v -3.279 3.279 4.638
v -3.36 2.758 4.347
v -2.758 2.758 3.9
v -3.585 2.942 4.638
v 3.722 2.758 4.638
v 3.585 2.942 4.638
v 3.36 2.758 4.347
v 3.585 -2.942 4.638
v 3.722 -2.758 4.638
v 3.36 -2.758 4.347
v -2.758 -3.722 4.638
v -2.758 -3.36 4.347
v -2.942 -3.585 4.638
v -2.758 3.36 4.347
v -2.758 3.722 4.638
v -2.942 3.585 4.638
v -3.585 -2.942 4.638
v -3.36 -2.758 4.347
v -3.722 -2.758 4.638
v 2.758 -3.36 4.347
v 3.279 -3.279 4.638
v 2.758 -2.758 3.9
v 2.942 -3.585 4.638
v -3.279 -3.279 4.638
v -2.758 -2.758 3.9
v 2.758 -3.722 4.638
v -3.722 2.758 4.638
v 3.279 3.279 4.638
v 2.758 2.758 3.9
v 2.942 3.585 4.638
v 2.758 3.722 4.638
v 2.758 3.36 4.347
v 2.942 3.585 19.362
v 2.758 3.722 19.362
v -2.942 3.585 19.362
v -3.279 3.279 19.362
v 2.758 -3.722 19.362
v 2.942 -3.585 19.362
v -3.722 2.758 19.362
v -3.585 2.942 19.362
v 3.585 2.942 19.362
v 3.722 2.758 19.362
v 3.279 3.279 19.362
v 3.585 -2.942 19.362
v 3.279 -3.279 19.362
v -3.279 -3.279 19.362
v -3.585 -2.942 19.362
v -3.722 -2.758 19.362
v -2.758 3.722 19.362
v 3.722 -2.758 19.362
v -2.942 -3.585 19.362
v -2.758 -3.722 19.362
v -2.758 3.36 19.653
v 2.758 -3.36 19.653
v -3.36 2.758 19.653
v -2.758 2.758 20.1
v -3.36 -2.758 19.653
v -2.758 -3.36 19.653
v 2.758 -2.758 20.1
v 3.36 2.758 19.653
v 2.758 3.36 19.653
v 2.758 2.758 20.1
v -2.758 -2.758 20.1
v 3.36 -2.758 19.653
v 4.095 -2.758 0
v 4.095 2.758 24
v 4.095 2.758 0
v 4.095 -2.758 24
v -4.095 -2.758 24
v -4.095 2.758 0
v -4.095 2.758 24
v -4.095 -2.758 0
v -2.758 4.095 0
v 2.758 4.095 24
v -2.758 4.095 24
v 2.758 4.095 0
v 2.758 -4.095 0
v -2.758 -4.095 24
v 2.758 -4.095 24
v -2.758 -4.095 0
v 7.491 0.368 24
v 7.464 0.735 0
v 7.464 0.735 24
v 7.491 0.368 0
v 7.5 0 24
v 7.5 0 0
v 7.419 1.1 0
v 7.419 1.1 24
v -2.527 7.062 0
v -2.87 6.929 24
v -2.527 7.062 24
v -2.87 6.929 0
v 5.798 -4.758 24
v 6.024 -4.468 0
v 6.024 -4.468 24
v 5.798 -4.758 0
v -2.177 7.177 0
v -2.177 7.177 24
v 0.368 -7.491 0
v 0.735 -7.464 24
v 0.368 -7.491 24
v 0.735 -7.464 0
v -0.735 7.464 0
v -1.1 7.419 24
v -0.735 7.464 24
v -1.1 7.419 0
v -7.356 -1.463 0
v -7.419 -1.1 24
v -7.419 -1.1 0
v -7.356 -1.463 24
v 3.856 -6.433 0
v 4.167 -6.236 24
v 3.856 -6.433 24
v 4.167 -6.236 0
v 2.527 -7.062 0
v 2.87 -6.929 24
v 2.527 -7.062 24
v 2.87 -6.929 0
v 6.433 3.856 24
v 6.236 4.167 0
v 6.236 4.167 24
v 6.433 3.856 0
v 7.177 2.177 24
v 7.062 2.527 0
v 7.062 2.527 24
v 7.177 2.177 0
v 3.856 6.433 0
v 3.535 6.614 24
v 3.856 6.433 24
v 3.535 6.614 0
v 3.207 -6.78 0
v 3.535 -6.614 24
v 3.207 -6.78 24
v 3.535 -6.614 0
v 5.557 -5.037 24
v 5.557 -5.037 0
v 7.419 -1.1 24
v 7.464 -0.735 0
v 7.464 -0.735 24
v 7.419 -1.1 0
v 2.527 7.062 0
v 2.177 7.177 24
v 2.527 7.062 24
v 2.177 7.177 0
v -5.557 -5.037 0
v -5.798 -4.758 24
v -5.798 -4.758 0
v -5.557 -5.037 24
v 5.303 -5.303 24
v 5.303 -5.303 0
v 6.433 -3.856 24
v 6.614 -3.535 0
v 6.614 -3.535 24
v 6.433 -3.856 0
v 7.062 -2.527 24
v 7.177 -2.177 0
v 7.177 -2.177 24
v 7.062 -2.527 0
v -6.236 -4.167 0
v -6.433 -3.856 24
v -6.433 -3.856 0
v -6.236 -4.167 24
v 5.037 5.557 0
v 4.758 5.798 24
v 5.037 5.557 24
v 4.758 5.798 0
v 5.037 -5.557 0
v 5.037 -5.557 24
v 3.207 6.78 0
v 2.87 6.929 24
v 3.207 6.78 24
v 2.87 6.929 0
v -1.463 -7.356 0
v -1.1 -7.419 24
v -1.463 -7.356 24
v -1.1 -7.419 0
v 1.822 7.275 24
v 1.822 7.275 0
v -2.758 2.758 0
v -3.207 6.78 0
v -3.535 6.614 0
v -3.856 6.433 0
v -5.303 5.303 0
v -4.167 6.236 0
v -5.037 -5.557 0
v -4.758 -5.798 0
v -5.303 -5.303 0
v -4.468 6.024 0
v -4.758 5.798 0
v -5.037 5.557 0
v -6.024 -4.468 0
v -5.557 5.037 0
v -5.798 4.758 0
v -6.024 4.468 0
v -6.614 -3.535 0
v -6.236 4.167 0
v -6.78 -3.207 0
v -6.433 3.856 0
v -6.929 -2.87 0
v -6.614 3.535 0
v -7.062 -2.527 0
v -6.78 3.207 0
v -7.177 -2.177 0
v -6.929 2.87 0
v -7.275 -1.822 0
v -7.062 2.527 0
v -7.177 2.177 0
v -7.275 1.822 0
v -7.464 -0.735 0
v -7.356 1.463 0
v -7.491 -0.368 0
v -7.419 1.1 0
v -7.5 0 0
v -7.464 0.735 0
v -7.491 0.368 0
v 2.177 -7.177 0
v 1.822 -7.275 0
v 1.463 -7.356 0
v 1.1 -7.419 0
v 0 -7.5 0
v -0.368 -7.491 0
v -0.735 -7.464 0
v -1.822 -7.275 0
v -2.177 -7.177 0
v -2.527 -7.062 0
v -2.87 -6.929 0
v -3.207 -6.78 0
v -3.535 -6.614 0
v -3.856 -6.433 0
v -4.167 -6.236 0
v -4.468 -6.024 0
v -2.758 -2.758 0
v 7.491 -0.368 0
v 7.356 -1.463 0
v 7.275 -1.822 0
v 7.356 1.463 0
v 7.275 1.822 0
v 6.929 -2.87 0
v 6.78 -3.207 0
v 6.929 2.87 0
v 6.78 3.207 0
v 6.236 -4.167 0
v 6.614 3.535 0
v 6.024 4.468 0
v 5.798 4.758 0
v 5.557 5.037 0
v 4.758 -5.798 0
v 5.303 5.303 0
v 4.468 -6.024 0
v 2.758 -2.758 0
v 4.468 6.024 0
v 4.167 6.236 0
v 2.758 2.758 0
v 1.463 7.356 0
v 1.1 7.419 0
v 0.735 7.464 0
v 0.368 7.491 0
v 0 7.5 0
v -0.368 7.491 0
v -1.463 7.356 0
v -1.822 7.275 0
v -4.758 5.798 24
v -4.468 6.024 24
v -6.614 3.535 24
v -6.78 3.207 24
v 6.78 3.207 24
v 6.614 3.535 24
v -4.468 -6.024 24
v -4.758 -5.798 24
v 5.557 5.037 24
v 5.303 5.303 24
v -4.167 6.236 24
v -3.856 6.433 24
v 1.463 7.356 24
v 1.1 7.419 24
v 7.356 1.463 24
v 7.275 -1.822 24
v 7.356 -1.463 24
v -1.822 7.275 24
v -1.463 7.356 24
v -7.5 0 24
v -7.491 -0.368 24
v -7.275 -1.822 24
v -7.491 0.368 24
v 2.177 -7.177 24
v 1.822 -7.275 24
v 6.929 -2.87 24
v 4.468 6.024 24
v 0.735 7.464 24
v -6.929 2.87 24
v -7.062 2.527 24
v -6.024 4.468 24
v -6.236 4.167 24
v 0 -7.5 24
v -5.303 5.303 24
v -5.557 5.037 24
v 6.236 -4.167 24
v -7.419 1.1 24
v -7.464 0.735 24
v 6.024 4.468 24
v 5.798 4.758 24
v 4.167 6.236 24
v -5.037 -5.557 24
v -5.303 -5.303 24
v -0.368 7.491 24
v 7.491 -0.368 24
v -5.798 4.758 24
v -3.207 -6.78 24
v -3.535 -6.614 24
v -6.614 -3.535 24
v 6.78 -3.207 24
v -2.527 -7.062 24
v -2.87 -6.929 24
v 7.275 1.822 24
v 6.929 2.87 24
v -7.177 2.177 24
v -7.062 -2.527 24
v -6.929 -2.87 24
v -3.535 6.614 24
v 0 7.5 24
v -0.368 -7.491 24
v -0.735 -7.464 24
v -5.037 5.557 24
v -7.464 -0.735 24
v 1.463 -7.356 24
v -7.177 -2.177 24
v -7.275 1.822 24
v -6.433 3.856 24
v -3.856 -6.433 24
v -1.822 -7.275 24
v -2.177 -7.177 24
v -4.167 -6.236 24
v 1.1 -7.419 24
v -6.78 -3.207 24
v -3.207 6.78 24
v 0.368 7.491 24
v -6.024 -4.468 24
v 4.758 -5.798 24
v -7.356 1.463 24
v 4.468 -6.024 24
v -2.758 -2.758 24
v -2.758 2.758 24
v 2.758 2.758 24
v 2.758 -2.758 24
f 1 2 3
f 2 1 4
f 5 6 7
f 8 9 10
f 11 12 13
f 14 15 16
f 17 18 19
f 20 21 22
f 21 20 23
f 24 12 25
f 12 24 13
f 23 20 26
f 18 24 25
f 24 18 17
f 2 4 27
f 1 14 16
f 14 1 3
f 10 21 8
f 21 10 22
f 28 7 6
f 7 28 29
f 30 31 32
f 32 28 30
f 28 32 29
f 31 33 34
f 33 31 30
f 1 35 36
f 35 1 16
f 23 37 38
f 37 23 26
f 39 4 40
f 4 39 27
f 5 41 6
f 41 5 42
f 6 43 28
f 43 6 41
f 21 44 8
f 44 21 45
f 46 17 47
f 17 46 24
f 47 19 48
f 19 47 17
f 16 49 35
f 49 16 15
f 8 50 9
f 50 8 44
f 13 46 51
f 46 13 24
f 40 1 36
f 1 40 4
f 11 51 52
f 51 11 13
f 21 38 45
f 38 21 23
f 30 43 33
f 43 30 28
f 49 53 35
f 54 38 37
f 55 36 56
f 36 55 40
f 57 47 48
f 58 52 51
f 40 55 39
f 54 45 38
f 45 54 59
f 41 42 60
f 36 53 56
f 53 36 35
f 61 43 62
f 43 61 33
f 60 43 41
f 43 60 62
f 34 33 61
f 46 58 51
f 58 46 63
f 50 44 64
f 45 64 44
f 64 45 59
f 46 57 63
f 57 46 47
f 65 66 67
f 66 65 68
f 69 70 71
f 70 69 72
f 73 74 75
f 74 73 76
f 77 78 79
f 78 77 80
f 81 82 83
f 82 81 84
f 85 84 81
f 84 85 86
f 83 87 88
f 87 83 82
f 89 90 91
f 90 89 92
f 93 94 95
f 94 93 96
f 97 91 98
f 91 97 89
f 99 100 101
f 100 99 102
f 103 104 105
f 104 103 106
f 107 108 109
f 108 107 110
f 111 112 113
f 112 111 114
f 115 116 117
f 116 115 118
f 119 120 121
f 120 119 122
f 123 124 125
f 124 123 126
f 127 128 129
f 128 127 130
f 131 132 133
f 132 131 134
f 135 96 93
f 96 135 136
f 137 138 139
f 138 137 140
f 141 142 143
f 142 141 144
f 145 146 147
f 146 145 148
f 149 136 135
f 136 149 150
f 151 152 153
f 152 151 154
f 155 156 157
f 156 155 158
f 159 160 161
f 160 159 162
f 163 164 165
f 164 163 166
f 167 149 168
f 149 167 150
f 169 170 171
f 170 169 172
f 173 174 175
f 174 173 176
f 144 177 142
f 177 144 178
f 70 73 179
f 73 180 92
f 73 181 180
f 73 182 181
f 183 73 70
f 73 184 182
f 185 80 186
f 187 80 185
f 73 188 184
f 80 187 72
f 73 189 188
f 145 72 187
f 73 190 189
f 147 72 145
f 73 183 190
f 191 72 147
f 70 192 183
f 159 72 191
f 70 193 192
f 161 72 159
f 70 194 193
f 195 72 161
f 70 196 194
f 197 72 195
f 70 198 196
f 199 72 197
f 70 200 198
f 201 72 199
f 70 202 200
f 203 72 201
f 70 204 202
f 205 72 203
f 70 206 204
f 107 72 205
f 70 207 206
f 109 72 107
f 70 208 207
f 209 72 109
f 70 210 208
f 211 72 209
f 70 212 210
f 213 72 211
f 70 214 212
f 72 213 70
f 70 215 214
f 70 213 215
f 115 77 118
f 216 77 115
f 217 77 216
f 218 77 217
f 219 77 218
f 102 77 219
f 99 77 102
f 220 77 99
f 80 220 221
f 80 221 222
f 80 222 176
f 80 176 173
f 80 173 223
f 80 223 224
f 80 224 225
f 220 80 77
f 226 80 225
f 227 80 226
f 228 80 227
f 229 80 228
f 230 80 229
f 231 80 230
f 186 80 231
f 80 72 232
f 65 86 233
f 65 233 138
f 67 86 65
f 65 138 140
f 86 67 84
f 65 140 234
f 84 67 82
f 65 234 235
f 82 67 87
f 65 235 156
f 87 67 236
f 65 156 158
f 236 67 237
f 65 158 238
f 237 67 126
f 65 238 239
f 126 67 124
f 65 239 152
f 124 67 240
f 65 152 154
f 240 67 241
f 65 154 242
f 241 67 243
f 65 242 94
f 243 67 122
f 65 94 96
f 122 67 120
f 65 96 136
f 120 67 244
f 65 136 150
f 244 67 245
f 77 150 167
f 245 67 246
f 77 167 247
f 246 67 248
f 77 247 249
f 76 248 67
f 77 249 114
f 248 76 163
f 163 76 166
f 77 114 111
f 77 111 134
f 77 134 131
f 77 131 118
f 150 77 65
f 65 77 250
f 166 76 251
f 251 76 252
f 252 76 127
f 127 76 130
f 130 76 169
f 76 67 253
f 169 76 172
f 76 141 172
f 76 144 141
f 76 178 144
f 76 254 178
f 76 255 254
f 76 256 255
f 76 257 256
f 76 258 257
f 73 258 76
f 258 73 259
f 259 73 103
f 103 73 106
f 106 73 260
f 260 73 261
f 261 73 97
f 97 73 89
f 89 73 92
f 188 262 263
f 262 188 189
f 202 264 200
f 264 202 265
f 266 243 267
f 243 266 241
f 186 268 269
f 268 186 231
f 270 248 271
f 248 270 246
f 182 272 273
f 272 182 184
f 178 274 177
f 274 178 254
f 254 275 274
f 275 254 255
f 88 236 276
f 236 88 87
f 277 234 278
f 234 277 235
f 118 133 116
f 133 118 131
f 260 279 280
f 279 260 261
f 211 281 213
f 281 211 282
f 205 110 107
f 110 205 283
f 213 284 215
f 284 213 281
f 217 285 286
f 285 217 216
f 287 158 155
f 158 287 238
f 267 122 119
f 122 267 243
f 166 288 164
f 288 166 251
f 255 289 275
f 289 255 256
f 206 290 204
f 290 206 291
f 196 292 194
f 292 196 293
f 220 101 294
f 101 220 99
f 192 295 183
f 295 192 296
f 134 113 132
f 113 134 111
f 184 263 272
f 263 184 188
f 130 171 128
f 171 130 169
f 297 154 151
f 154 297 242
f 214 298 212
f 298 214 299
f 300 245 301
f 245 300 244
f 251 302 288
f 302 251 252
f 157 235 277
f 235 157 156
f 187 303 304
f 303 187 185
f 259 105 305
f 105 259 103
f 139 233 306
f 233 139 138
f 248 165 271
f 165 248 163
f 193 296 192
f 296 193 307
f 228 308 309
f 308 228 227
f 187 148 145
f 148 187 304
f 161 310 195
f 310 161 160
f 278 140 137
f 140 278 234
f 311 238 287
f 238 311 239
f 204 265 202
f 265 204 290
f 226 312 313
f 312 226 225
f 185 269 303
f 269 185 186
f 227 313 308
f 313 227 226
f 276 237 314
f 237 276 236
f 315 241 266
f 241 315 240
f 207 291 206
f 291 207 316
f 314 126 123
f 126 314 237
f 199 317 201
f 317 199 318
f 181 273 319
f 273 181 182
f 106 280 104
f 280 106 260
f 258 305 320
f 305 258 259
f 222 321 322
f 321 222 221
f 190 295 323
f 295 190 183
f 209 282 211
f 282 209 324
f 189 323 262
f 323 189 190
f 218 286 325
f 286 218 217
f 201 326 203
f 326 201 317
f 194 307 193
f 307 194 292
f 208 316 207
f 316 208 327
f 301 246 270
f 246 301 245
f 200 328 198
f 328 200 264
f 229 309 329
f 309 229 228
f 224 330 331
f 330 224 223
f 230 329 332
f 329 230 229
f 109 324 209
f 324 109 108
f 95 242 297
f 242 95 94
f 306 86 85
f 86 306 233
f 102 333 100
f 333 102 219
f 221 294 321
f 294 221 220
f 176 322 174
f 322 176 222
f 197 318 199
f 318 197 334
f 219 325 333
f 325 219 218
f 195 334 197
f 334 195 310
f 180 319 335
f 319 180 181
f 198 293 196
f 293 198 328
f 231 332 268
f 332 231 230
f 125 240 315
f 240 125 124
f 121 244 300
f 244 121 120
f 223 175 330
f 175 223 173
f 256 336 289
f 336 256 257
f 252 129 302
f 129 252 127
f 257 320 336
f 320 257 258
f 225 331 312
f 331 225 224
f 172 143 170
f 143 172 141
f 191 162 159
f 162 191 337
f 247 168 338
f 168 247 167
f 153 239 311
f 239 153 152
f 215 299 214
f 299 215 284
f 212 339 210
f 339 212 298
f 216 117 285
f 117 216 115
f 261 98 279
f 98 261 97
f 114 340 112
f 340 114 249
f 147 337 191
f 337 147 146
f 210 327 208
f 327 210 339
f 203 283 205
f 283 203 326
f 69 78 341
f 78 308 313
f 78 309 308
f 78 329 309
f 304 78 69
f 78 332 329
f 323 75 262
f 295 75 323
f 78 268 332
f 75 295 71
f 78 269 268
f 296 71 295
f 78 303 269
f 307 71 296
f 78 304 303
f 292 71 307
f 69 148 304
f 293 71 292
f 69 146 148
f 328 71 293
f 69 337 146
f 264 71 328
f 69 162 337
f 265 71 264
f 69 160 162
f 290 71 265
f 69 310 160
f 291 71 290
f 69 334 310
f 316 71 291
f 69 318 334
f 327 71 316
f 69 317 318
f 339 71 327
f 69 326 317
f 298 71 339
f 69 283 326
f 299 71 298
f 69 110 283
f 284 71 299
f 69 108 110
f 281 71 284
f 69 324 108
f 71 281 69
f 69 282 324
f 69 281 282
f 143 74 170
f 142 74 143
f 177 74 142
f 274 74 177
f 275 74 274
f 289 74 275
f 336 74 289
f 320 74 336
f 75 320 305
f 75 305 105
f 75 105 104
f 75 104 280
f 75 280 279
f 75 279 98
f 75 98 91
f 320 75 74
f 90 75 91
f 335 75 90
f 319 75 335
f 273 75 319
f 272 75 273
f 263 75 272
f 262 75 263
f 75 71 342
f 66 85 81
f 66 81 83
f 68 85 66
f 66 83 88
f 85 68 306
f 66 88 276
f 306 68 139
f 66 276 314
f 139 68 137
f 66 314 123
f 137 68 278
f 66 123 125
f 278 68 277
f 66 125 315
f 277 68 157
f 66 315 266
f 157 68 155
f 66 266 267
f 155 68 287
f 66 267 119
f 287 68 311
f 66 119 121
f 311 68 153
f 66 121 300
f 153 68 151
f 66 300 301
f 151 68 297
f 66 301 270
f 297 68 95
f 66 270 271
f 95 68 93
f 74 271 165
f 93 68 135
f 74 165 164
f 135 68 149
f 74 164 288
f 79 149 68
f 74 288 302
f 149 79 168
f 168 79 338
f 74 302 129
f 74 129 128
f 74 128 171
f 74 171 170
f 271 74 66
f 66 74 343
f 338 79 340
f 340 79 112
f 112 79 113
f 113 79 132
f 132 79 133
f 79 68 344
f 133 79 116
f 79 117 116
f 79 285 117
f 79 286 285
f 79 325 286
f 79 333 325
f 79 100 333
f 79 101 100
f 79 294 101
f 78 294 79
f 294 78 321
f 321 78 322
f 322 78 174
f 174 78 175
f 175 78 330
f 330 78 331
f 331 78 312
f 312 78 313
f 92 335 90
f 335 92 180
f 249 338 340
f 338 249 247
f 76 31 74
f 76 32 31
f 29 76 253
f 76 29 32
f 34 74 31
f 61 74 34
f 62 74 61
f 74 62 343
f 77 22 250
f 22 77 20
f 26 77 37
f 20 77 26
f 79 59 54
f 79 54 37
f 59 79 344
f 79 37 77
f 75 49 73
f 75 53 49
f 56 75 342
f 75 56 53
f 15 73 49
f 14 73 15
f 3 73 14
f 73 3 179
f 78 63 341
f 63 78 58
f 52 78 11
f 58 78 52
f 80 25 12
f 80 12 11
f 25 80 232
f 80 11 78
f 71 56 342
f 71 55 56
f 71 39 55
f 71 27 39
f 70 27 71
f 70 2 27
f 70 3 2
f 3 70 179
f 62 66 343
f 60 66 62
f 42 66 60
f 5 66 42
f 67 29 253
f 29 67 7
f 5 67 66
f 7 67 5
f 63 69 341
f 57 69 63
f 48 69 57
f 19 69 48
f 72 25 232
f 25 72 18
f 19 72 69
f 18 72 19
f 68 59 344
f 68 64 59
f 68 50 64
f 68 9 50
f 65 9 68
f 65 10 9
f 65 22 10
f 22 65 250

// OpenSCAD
// Thanks for this one to Triffid Hunter!!

// PRUSA Mendel  
// Printable LM8UU bushing
// GNU GPL v3
// Josef Průša
// josefprusa@me.com
// prusadjs.cz
// http://www.reprap.org/wiki/Prusa_Mendel
// http://github.com/prusajr/PrusaMendel
module LM8UU(){
lm8uu_od = 15;
lm8uu_l = 24;
lm8uu_id = 7.8;

clearance_ratio = 1.05;

contact_length = 4;

cutout_width = lm8uu_id / sqrt(2);

%translate([0, 0, -lm8uu_l]) cylinder(r = lm8uu_id / 2, h=lm8uu_l * 3, $fn=256);
difference() {
	cylinder(r=lm8uu_od / 2, h=lm8uu_l, $fn=128);
	// corner cutouts
	translate([-cutout_width / 2, -lm8uu_id * clearance_ratio / 2, -1])
		cube([cutout_width, lm8uu_id * clearance_ratio, lm8uu_l + 2]);
	translate([-lm8uu_id * clearance_ratio / 2, -cutout_width / 2, -1])
		cube([lm8uu_id * clearance_ratio, cutout_width, lm8uu_l + 2]);
	// negative cylindrical shuttle for contact area
	intersection() {
		translate([-lm8uu_id * clearance_ratio /  2, -lm8uu_id * clearance_ratio / 2, -1]) cube([lm8uu_id * clearance_ratio, lm8uu_id * clearance_ratio, lm8uu_l + 2]);
		union() {
			cylinder(r1 = 0, r2 = lm8uu_id * sqrt(sqrt(2)) / 2, h = lm8uu_id * sqrt(sqrt(2)) / 2, $fn=64);
			translate([0, 0, lm8uu_id * sqrt(sqrt(2)) / 2])
				cylinder(r = lm8uu_id * sqrt(sqrt(2)) / 2, h = lm8uu_l - (lm8uu_id * sqrt(sqrt(2))), $fn=64);
			translate([0, 0, lm8uu_id * sqrt(sqrt(2)) / 2 + lm8uu_l - (lm8uu_id * sqrt(sqrt(2)))])
				cylinder(r1 = lm8uu_id * sqrt(sqrt(2)) / 2, r2 = 0, h = lm8uu_id * sqrt(sqrt(2)) / 2, $fn=64);
		}
	}
	// cutout for viewing internal structure
	//translate([0, 0, -1]) cube([20, 20, 30]);
}

}

LM8UU();
